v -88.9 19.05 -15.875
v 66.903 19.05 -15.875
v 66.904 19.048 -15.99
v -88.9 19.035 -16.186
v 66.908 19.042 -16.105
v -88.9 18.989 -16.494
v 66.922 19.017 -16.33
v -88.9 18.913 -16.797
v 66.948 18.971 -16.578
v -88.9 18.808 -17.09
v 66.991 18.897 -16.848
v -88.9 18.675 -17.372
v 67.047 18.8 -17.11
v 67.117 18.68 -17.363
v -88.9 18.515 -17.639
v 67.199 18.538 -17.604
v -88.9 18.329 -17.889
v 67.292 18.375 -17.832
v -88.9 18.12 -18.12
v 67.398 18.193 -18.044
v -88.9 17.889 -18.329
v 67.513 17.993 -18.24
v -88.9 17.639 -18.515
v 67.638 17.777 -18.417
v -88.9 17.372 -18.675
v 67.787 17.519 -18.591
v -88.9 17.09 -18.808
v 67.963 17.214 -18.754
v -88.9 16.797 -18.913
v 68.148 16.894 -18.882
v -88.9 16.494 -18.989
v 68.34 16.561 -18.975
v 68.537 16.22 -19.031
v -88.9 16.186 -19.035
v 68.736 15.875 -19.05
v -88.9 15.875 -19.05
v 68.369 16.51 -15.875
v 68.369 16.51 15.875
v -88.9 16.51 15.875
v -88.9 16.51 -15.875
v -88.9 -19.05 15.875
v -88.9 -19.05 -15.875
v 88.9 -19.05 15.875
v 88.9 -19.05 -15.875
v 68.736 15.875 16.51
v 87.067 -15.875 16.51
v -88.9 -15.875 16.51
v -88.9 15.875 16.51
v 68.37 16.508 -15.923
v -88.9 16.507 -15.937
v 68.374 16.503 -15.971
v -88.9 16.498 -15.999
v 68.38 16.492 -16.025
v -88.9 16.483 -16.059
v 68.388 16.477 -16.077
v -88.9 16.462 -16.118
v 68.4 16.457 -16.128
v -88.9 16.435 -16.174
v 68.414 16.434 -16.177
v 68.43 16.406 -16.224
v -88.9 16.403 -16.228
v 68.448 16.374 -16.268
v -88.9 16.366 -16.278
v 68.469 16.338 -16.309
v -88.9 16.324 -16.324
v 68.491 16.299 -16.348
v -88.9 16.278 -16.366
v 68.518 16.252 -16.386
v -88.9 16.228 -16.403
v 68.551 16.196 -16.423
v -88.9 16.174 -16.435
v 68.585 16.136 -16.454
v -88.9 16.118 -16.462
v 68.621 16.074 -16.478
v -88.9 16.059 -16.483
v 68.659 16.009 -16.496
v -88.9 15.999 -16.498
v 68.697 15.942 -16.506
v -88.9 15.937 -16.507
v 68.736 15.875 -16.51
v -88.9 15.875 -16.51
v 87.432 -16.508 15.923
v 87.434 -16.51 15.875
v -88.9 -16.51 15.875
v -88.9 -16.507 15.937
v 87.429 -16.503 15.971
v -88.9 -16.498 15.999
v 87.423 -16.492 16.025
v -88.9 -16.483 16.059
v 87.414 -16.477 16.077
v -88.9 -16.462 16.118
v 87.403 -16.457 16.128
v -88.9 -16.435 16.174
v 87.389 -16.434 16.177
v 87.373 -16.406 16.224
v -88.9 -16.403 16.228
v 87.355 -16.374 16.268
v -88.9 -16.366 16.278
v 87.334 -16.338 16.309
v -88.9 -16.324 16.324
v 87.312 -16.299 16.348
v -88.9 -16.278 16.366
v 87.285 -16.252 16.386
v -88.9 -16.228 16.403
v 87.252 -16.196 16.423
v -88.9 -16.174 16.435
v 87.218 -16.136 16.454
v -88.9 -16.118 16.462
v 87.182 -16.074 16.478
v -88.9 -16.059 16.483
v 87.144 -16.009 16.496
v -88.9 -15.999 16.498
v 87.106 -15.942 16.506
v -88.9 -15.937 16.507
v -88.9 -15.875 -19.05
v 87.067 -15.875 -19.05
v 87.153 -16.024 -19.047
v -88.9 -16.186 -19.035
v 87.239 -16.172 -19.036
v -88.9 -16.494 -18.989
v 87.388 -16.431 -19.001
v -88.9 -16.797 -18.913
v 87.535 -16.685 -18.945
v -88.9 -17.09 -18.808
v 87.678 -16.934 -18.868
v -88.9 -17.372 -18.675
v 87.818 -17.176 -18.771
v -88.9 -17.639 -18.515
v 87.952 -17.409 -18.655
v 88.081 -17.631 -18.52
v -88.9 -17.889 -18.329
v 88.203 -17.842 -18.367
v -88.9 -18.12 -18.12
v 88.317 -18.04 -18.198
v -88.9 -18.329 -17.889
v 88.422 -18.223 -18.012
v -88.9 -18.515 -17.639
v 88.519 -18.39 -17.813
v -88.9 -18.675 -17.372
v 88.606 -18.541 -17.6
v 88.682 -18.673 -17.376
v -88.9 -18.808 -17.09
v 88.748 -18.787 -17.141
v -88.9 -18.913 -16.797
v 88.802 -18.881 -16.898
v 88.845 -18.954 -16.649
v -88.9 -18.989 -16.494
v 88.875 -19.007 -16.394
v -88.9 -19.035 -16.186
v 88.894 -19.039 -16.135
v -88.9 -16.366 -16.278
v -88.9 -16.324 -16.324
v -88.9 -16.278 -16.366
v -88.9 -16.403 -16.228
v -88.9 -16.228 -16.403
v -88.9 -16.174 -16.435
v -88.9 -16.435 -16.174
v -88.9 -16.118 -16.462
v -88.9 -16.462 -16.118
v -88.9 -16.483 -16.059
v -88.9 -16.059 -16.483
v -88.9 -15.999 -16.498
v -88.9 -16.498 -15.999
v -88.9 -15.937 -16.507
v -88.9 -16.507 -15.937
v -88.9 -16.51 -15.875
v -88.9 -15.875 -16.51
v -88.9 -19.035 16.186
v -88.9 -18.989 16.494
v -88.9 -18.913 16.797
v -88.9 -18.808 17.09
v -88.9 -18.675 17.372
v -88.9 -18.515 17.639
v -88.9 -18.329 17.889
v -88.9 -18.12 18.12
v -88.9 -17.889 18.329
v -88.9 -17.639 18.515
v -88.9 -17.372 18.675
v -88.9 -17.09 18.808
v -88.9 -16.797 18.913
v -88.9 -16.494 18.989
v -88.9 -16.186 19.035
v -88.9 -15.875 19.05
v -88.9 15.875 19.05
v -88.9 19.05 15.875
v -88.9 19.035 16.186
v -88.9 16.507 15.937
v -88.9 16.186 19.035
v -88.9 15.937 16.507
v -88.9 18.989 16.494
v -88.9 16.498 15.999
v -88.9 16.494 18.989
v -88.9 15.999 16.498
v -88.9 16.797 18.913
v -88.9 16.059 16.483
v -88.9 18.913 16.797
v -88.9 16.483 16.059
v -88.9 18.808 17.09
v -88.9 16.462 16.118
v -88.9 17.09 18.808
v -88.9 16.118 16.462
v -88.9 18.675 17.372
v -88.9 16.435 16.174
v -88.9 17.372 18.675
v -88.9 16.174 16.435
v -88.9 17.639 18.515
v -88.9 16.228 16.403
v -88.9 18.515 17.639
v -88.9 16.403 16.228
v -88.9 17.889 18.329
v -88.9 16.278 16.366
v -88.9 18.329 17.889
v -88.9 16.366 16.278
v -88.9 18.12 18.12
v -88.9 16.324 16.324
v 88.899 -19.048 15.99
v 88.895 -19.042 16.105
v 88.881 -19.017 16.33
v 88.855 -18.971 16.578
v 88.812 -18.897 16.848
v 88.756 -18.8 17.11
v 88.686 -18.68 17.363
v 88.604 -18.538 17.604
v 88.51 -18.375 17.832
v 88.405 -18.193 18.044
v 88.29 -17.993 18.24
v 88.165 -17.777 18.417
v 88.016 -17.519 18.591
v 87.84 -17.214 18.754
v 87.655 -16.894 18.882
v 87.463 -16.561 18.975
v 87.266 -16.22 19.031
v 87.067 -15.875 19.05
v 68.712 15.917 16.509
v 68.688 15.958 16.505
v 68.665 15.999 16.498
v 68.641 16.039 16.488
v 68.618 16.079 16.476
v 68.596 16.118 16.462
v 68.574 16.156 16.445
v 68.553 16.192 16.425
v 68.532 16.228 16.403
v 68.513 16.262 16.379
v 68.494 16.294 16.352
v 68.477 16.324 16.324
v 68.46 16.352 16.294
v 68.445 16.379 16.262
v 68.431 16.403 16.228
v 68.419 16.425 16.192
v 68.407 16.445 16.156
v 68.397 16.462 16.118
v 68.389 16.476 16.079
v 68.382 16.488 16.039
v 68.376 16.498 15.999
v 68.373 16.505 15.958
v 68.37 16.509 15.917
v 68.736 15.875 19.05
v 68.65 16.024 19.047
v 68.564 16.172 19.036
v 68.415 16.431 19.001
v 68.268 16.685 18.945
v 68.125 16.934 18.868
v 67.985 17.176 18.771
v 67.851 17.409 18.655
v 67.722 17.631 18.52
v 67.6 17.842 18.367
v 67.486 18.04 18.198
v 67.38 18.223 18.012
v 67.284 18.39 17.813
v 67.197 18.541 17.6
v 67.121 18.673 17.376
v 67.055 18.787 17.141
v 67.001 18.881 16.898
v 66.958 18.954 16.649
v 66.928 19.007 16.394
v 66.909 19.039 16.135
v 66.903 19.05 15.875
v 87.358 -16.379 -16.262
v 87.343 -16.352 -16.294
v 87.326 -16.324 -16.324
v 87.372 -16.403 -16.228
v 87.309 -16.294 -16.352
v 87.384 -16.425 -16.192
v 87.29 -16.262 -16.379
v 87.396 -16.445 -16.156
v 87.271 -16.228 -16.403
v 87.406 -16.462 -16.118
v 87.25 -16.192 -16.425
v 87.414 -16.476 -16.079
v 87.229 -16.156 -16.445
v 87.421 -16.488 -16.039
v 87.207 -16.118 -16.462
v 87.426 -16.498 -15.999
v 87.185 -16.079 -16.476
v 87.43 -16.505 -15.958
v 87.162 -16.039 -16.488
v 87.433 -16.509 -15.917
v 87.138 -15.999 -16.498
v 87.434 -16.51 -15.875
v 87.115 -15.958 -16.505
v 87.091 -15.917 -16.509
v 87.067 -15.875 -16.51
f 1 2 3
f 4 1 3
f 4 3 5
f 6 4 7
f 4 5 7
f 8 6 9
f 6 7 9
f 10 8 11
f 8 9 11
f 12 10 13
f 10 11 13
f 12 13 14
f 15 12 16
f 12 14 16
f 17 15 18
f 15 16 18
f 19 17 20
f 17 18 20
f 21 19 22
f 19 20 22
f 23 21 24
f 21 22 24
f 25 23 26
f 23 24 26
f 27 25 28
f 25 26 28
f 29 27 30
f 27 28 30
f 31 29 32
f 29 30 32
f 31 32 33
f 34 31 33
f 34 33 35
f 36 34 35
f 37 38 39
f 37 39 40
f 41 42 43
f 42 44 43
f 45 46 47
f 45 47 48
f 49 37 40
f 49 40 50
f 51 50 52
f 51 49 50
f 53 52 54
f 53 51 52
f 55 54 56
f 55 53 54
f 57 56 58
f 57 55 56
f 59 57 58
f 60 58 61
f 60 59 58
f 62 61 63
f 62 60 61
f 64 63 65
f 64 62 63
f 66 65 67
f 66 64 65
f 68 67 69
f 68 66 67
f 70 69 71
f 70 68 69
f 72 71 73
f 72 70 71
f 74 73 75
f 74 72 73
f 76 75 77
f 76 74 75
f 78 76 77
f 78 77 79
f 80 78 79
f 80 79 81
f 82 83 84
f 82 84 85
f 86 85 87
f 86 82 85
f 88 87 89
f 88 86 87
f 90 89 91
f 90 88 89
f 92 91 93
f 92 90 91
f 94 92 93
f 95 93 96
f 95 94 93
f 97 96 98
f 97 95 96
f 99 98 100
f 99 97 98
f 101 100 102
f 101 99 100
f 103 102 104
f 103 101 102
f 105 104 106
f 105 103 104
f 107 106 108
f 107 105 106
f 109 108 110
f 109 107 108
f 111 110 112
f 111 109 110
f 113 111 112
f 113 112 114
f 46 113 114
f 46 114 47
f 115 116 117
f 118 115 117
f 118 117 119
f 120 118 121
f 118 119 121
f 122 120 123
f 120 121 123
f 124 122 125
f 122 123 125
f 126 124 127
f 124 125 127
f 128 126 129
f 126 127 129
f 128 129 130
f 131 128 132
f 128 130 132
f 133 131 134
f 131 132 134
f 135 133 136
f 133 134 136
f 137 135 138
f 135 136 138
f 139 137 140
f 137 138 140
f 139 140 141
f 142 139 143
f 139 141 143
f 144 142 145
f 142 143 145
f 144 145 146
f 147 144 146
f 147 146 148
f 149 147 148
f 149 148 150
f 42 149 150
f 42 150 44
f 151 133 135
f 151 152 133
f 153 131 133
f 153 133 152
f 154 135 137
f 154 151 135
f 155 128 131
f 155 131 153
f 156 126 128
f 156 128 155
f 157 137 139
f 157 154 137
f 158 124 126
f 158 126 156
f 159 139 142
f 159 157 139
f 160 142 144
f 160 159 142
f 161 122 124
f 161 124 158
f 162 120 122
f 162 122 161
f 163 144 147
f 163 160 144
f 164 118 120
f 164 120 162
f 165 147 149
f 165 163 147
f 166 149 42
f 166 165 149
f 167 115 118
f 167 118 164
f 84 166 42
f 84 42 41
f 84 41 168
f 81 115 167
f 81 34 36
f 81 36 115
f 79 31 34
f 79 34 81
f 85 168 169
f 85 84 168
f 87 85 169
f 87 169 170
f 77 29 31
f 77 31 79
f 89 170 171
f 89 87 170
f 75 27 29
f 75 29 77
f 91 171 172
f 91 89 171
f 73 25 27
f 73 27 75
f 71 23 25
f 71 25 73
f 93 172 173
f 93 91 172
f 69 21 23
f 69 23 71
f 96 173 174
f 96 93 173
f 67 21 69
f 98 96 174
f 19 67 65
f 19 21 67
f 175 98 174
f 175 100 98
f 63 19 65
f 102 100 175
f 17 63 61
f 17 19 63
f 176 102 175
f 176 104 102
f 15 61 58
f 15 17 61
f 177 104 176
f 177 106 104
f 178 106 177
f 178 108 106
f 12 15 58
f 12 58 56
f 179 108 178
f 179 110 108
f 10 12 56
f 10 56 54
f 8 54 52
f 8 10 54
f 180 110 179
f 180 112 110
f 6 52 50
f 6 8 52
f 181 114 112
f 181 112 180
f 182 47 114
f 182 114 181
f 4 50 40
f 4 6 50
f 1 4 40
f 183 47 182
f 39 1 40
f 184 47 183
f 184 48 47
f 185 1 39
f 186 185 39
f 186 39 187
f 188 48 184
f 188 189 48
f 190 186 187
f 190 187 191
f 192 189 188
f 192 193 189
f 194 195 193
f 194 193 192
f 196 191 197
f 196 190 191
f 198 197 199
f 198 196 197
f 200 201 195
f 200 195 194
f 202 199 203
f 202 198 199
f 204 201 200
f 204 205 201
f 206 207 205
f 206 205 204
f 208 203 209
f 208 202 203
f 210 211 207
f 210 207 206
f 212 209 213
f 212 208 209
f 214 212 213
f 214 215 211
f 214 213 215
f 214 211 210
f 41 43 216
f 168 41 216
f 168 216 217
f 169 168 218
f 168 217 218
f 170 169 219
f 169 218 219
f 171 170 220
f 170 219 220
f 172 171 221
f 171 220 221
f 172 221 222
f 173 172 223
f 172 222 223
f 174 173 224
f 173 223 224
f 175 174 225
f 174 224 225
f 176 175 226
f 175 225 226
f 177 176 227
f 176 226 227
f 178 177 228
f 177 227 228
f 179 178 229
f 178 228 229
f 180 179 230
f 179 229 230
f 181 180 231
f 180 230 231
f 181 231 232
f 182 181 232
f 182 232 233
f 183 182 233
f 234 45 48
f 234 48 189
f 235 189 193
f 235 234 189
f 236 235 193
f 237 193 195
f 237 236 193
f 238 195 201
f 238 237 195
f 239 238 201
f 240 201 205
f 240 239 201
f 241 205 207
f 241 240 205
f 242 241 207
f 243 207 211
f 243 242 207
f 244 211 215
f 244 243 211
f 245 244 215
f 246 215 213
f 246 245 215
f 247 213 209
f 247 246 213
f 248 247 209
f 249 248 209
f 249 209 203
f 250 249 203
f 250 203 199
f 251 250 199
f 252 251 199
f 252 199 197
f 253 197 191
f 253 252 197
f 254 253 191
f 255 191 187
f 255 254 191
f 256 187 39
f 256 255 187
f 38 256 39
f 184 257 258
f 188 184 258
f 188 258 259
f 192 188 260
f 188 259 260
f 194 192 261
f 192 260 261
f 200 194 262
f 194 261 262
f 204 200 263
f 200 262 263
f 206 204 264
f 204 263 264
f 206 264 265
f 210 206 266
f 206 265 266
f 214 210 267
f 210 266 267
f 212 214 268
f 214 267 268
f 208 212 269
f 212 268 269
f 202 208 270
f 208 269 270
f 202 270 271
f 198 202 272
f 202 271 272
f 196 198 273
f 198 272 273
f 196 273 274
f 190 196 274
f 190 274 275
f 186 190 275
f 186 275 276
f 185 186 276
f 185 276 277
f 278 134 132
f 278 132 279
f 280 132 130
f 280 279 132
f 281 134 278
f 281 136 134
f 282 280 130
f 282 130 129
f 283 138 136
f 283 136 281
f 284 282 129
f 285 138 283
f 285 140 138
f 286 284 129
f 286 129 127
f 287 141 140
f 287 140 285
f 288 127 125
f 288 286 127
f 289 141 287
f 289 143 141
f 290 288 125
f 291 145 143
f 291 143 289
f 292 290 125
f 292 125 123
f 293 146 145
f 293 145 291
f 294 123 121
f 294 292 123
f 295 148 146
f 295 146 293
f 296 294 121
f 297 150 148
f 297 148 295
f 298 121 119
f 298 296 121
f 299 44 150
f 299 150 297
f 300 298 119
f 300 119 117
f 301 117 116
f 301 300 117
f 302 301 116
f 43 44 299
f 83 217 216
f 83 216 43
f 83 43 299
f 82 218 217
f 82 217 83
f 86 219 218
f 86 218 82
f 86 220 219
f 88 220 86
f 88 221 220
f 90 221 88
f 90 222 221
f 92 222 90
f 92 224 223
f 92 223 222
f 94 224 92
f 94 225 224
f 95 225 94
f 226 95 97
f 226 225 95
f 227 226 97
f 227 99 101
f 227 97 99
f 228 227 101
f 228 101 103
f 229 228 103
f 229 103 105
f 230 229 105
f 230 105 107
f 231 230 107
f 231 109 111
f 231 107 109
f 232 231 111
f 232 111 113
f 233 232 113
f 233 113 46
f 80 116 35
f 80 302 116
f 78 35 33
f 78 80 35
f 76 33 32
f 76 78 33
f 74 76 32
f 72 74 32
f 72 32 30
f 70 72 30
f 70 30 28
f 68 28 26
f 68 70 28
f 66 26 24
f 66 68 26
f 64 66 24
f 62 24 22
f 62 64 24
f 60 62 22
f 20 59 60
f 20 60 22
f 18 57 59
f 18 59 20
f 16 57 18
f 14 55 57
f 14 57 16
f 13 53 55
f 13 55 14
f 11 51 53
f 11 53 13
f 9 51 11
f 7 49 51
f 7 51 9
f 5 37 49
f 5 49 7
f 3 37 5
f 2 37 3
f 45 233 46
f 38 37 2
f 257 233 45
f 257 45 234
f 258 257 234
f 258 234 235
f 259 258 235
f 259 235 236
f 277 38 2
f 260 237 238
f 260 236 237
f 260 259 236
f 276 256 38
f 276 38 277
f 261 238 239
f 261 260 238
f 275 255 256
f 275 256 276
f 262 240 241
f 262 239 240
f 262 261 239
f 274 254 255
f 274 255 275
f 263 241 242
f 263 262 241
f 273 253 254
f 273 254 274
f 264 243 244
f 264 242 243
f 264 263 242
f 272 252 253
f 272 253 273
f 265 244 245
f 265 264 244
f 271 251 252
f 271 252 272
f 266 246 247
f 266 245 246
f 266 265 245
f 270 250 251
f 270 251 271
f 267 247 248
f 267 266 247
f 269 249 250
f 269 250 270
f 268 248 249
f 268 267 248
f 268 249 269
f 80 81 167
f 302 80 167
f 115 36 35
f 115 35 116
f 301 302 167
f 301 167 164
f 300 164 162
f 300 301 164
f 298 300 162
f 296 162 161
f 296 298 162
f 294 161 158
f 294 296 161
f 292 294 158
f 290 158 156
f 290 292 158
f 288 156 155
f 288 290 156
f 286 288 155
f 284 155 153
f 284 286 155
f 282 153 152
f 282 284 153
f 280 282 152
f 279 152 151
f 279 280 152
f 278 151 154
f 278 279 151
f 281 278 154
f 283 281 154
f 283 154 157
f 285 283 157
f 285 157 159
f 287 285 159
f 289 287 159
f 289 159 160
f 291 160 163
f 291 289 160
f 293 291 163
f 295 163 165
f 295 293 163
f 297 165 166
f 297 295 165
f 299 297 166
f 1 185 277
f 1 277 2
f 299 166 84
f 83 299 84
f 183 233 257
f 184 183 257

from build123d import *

# Parameters (mm, degrees)
EXTRUDE_THIN1_DEPTH     = 88.9
CUT_EXTRUDE1_DEPTH      = 1
CUT_EXTRUDE1_DEPTH_BACK = 39.1


with BuildPart() as part:
    # Sketch1 → Extrude-Thin1 (new body, symmetric)
    with BuildSketch(Plane(origin=(0, 0, 0), x_dir=(0, 0, -1), z_dir=(1, 0, 0))):
        with BuildLine():
            Line((-15.875, 19.05), (15.875, 19.05))
            ThreePointArc((15.875, 19.05), (18.12006403, 18.12006403), (19.05, 15.875))
            Line((19.05, 15.875), (19.05, -15.875))
            ThreePointArc((19.05, -15.875), (18.12006403, -18.12006403), (15.875, -19.05))
            Line((15.875, -19.05), (-15.875, -19.05))
            ThreePointArc((-15.875, -19.05), (-18.12006403, -18.12006403), (-19.05, -15.875))
            Line((-19.05, -15.875), (-19.05, 15.875))
            ThreePointArc((-19.05, 15.875), (-18.12006403, 18.12006403), (-15.875, 19.05))
        make_face()
        with BuildLine():
            Line((-15.875, 16.51), (15.875, 16.51))
            ThreePointArc((15.875, 16.51), (16.324012806, 16.324012806), (16.51, 15.875))
            Line((16.51, 15.875), (16.51, -15.875))
            ThreePointArc((16.51, -15.875), (16.324012806, -16.324012806), (15.875, -16.51))
            Line((15.875, -16.51), (-15.875, -16.51))
            ThreePointArc((-15.875, -16.51), (-16.324012806, -16.324012806), (-16.51, -15.875))
            Line((-16.51, -15.875), (-16.51, 15.875))
            ThreePointArc((-16.51, 15.875), (-16.324012806, 16.324012806), (-15.875, 16.51))
        make_face(mode=Mode.SUBTRACT)
    extrude(amount=EXTRUDE_THIN1_DEPTH, both=True)

    # Sketch2 → Cut-Extrude1 (cut, two sides)
    with BuildSketch(Plane.XY.offset(19.05)) as cut_extrude1_sk:
        Polygon((275.736327504, -342.660011936), (88.9, -19.05), (66.902954744, 19.05), (-119.93337276, 342.660011936), (527.286651112, 716.332666943), (922.956351375, 31.012643071), align=None)
    extrude(amount=CUT_EXTRUDE1_DEPTH, mode=Mode.SUBTRACT)
    extrude(cut_extrude1_sk.sketch, amount=-CUT_EXTRUDE1_DEPTH_BACK, mode=Mode.SUBTRACT)


solid = part.part
